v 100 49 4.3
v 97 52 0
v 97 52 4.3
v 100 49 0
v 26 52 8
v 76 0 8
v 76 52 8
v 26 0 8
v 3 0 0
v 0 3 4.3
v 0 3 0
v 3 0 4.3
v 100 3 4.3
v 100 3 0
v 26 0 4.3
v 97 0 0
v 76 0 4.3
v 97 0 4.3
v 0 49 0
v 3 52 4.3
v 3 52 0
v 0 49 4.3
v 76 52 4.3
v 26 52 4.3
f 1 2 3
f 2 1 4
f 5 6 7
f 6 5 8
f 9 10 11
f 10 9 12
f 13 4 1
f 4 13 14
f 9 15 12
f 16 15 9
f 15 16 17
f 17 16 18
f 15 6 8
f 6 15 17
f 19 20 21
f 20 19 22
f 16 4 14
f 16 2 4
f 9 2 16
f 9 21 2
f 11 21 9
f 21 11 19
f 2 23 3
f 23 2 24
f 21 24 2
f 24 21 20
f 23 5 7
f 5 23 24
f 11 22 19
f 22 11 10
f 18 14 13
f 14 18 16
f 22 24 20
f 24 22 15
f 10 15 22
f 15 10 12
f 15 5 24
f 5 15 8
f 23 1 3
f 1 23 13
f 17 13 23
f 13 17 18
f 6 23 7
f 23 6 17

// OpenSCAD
$fn = 32;

// ----------------------------------------------------------------------
// Stepped bar: centerstep, 100 x 52 x 8/4.3 mm
// ----------------------------------------------------------------------

// --- parameters (mm) ---
bar_l = 100;              // bar length, X
bar_w = 52;               // bar width, Y
plate_t = 8;              // thickness of the thick zone, Z
thin_t = 4.3;             // thickness of the thin zone
corner_c = 3;             // corner chamfer of the bar
step_cut = 3.7;           // material removed from the thin zone
thick_from = 26;          // start of the thick middle zone
thick_to = 76;            // end of the thick middle zone
depth_1 = 3.7;            // depth of cut 1 from the top face
depth_2 = 3.7;            // depth of cut 2 from the top face

profile = [[3, 0], [97, 0], [100, 3], [100, 49], [97, 52], [3, 52], [0, 49], [0, 3]];  // primary outline, 8 points, counter clockwise
void_1 = [[-1, -1], [26, -1], [26, 53], [-1, 53]];  // thin left end, 4 points
void_2 = [[76, -1], [101, -1], [101, 53], [76, 53]];  // thin right end, 4 points

// --- the one profile operation ---
difference() {
  linear_extrude(height = plate_t) polygon(points = profile);
  translate([0, 0, plate_t - depth_1])
    linear_extrude(height = depth_1 + 1) polygon(points = void_1);
  translate([0, 0, plate_t - depth_2])
    linear_extrude(height = depth_2 + 1) polygon(points = void_2);
}
